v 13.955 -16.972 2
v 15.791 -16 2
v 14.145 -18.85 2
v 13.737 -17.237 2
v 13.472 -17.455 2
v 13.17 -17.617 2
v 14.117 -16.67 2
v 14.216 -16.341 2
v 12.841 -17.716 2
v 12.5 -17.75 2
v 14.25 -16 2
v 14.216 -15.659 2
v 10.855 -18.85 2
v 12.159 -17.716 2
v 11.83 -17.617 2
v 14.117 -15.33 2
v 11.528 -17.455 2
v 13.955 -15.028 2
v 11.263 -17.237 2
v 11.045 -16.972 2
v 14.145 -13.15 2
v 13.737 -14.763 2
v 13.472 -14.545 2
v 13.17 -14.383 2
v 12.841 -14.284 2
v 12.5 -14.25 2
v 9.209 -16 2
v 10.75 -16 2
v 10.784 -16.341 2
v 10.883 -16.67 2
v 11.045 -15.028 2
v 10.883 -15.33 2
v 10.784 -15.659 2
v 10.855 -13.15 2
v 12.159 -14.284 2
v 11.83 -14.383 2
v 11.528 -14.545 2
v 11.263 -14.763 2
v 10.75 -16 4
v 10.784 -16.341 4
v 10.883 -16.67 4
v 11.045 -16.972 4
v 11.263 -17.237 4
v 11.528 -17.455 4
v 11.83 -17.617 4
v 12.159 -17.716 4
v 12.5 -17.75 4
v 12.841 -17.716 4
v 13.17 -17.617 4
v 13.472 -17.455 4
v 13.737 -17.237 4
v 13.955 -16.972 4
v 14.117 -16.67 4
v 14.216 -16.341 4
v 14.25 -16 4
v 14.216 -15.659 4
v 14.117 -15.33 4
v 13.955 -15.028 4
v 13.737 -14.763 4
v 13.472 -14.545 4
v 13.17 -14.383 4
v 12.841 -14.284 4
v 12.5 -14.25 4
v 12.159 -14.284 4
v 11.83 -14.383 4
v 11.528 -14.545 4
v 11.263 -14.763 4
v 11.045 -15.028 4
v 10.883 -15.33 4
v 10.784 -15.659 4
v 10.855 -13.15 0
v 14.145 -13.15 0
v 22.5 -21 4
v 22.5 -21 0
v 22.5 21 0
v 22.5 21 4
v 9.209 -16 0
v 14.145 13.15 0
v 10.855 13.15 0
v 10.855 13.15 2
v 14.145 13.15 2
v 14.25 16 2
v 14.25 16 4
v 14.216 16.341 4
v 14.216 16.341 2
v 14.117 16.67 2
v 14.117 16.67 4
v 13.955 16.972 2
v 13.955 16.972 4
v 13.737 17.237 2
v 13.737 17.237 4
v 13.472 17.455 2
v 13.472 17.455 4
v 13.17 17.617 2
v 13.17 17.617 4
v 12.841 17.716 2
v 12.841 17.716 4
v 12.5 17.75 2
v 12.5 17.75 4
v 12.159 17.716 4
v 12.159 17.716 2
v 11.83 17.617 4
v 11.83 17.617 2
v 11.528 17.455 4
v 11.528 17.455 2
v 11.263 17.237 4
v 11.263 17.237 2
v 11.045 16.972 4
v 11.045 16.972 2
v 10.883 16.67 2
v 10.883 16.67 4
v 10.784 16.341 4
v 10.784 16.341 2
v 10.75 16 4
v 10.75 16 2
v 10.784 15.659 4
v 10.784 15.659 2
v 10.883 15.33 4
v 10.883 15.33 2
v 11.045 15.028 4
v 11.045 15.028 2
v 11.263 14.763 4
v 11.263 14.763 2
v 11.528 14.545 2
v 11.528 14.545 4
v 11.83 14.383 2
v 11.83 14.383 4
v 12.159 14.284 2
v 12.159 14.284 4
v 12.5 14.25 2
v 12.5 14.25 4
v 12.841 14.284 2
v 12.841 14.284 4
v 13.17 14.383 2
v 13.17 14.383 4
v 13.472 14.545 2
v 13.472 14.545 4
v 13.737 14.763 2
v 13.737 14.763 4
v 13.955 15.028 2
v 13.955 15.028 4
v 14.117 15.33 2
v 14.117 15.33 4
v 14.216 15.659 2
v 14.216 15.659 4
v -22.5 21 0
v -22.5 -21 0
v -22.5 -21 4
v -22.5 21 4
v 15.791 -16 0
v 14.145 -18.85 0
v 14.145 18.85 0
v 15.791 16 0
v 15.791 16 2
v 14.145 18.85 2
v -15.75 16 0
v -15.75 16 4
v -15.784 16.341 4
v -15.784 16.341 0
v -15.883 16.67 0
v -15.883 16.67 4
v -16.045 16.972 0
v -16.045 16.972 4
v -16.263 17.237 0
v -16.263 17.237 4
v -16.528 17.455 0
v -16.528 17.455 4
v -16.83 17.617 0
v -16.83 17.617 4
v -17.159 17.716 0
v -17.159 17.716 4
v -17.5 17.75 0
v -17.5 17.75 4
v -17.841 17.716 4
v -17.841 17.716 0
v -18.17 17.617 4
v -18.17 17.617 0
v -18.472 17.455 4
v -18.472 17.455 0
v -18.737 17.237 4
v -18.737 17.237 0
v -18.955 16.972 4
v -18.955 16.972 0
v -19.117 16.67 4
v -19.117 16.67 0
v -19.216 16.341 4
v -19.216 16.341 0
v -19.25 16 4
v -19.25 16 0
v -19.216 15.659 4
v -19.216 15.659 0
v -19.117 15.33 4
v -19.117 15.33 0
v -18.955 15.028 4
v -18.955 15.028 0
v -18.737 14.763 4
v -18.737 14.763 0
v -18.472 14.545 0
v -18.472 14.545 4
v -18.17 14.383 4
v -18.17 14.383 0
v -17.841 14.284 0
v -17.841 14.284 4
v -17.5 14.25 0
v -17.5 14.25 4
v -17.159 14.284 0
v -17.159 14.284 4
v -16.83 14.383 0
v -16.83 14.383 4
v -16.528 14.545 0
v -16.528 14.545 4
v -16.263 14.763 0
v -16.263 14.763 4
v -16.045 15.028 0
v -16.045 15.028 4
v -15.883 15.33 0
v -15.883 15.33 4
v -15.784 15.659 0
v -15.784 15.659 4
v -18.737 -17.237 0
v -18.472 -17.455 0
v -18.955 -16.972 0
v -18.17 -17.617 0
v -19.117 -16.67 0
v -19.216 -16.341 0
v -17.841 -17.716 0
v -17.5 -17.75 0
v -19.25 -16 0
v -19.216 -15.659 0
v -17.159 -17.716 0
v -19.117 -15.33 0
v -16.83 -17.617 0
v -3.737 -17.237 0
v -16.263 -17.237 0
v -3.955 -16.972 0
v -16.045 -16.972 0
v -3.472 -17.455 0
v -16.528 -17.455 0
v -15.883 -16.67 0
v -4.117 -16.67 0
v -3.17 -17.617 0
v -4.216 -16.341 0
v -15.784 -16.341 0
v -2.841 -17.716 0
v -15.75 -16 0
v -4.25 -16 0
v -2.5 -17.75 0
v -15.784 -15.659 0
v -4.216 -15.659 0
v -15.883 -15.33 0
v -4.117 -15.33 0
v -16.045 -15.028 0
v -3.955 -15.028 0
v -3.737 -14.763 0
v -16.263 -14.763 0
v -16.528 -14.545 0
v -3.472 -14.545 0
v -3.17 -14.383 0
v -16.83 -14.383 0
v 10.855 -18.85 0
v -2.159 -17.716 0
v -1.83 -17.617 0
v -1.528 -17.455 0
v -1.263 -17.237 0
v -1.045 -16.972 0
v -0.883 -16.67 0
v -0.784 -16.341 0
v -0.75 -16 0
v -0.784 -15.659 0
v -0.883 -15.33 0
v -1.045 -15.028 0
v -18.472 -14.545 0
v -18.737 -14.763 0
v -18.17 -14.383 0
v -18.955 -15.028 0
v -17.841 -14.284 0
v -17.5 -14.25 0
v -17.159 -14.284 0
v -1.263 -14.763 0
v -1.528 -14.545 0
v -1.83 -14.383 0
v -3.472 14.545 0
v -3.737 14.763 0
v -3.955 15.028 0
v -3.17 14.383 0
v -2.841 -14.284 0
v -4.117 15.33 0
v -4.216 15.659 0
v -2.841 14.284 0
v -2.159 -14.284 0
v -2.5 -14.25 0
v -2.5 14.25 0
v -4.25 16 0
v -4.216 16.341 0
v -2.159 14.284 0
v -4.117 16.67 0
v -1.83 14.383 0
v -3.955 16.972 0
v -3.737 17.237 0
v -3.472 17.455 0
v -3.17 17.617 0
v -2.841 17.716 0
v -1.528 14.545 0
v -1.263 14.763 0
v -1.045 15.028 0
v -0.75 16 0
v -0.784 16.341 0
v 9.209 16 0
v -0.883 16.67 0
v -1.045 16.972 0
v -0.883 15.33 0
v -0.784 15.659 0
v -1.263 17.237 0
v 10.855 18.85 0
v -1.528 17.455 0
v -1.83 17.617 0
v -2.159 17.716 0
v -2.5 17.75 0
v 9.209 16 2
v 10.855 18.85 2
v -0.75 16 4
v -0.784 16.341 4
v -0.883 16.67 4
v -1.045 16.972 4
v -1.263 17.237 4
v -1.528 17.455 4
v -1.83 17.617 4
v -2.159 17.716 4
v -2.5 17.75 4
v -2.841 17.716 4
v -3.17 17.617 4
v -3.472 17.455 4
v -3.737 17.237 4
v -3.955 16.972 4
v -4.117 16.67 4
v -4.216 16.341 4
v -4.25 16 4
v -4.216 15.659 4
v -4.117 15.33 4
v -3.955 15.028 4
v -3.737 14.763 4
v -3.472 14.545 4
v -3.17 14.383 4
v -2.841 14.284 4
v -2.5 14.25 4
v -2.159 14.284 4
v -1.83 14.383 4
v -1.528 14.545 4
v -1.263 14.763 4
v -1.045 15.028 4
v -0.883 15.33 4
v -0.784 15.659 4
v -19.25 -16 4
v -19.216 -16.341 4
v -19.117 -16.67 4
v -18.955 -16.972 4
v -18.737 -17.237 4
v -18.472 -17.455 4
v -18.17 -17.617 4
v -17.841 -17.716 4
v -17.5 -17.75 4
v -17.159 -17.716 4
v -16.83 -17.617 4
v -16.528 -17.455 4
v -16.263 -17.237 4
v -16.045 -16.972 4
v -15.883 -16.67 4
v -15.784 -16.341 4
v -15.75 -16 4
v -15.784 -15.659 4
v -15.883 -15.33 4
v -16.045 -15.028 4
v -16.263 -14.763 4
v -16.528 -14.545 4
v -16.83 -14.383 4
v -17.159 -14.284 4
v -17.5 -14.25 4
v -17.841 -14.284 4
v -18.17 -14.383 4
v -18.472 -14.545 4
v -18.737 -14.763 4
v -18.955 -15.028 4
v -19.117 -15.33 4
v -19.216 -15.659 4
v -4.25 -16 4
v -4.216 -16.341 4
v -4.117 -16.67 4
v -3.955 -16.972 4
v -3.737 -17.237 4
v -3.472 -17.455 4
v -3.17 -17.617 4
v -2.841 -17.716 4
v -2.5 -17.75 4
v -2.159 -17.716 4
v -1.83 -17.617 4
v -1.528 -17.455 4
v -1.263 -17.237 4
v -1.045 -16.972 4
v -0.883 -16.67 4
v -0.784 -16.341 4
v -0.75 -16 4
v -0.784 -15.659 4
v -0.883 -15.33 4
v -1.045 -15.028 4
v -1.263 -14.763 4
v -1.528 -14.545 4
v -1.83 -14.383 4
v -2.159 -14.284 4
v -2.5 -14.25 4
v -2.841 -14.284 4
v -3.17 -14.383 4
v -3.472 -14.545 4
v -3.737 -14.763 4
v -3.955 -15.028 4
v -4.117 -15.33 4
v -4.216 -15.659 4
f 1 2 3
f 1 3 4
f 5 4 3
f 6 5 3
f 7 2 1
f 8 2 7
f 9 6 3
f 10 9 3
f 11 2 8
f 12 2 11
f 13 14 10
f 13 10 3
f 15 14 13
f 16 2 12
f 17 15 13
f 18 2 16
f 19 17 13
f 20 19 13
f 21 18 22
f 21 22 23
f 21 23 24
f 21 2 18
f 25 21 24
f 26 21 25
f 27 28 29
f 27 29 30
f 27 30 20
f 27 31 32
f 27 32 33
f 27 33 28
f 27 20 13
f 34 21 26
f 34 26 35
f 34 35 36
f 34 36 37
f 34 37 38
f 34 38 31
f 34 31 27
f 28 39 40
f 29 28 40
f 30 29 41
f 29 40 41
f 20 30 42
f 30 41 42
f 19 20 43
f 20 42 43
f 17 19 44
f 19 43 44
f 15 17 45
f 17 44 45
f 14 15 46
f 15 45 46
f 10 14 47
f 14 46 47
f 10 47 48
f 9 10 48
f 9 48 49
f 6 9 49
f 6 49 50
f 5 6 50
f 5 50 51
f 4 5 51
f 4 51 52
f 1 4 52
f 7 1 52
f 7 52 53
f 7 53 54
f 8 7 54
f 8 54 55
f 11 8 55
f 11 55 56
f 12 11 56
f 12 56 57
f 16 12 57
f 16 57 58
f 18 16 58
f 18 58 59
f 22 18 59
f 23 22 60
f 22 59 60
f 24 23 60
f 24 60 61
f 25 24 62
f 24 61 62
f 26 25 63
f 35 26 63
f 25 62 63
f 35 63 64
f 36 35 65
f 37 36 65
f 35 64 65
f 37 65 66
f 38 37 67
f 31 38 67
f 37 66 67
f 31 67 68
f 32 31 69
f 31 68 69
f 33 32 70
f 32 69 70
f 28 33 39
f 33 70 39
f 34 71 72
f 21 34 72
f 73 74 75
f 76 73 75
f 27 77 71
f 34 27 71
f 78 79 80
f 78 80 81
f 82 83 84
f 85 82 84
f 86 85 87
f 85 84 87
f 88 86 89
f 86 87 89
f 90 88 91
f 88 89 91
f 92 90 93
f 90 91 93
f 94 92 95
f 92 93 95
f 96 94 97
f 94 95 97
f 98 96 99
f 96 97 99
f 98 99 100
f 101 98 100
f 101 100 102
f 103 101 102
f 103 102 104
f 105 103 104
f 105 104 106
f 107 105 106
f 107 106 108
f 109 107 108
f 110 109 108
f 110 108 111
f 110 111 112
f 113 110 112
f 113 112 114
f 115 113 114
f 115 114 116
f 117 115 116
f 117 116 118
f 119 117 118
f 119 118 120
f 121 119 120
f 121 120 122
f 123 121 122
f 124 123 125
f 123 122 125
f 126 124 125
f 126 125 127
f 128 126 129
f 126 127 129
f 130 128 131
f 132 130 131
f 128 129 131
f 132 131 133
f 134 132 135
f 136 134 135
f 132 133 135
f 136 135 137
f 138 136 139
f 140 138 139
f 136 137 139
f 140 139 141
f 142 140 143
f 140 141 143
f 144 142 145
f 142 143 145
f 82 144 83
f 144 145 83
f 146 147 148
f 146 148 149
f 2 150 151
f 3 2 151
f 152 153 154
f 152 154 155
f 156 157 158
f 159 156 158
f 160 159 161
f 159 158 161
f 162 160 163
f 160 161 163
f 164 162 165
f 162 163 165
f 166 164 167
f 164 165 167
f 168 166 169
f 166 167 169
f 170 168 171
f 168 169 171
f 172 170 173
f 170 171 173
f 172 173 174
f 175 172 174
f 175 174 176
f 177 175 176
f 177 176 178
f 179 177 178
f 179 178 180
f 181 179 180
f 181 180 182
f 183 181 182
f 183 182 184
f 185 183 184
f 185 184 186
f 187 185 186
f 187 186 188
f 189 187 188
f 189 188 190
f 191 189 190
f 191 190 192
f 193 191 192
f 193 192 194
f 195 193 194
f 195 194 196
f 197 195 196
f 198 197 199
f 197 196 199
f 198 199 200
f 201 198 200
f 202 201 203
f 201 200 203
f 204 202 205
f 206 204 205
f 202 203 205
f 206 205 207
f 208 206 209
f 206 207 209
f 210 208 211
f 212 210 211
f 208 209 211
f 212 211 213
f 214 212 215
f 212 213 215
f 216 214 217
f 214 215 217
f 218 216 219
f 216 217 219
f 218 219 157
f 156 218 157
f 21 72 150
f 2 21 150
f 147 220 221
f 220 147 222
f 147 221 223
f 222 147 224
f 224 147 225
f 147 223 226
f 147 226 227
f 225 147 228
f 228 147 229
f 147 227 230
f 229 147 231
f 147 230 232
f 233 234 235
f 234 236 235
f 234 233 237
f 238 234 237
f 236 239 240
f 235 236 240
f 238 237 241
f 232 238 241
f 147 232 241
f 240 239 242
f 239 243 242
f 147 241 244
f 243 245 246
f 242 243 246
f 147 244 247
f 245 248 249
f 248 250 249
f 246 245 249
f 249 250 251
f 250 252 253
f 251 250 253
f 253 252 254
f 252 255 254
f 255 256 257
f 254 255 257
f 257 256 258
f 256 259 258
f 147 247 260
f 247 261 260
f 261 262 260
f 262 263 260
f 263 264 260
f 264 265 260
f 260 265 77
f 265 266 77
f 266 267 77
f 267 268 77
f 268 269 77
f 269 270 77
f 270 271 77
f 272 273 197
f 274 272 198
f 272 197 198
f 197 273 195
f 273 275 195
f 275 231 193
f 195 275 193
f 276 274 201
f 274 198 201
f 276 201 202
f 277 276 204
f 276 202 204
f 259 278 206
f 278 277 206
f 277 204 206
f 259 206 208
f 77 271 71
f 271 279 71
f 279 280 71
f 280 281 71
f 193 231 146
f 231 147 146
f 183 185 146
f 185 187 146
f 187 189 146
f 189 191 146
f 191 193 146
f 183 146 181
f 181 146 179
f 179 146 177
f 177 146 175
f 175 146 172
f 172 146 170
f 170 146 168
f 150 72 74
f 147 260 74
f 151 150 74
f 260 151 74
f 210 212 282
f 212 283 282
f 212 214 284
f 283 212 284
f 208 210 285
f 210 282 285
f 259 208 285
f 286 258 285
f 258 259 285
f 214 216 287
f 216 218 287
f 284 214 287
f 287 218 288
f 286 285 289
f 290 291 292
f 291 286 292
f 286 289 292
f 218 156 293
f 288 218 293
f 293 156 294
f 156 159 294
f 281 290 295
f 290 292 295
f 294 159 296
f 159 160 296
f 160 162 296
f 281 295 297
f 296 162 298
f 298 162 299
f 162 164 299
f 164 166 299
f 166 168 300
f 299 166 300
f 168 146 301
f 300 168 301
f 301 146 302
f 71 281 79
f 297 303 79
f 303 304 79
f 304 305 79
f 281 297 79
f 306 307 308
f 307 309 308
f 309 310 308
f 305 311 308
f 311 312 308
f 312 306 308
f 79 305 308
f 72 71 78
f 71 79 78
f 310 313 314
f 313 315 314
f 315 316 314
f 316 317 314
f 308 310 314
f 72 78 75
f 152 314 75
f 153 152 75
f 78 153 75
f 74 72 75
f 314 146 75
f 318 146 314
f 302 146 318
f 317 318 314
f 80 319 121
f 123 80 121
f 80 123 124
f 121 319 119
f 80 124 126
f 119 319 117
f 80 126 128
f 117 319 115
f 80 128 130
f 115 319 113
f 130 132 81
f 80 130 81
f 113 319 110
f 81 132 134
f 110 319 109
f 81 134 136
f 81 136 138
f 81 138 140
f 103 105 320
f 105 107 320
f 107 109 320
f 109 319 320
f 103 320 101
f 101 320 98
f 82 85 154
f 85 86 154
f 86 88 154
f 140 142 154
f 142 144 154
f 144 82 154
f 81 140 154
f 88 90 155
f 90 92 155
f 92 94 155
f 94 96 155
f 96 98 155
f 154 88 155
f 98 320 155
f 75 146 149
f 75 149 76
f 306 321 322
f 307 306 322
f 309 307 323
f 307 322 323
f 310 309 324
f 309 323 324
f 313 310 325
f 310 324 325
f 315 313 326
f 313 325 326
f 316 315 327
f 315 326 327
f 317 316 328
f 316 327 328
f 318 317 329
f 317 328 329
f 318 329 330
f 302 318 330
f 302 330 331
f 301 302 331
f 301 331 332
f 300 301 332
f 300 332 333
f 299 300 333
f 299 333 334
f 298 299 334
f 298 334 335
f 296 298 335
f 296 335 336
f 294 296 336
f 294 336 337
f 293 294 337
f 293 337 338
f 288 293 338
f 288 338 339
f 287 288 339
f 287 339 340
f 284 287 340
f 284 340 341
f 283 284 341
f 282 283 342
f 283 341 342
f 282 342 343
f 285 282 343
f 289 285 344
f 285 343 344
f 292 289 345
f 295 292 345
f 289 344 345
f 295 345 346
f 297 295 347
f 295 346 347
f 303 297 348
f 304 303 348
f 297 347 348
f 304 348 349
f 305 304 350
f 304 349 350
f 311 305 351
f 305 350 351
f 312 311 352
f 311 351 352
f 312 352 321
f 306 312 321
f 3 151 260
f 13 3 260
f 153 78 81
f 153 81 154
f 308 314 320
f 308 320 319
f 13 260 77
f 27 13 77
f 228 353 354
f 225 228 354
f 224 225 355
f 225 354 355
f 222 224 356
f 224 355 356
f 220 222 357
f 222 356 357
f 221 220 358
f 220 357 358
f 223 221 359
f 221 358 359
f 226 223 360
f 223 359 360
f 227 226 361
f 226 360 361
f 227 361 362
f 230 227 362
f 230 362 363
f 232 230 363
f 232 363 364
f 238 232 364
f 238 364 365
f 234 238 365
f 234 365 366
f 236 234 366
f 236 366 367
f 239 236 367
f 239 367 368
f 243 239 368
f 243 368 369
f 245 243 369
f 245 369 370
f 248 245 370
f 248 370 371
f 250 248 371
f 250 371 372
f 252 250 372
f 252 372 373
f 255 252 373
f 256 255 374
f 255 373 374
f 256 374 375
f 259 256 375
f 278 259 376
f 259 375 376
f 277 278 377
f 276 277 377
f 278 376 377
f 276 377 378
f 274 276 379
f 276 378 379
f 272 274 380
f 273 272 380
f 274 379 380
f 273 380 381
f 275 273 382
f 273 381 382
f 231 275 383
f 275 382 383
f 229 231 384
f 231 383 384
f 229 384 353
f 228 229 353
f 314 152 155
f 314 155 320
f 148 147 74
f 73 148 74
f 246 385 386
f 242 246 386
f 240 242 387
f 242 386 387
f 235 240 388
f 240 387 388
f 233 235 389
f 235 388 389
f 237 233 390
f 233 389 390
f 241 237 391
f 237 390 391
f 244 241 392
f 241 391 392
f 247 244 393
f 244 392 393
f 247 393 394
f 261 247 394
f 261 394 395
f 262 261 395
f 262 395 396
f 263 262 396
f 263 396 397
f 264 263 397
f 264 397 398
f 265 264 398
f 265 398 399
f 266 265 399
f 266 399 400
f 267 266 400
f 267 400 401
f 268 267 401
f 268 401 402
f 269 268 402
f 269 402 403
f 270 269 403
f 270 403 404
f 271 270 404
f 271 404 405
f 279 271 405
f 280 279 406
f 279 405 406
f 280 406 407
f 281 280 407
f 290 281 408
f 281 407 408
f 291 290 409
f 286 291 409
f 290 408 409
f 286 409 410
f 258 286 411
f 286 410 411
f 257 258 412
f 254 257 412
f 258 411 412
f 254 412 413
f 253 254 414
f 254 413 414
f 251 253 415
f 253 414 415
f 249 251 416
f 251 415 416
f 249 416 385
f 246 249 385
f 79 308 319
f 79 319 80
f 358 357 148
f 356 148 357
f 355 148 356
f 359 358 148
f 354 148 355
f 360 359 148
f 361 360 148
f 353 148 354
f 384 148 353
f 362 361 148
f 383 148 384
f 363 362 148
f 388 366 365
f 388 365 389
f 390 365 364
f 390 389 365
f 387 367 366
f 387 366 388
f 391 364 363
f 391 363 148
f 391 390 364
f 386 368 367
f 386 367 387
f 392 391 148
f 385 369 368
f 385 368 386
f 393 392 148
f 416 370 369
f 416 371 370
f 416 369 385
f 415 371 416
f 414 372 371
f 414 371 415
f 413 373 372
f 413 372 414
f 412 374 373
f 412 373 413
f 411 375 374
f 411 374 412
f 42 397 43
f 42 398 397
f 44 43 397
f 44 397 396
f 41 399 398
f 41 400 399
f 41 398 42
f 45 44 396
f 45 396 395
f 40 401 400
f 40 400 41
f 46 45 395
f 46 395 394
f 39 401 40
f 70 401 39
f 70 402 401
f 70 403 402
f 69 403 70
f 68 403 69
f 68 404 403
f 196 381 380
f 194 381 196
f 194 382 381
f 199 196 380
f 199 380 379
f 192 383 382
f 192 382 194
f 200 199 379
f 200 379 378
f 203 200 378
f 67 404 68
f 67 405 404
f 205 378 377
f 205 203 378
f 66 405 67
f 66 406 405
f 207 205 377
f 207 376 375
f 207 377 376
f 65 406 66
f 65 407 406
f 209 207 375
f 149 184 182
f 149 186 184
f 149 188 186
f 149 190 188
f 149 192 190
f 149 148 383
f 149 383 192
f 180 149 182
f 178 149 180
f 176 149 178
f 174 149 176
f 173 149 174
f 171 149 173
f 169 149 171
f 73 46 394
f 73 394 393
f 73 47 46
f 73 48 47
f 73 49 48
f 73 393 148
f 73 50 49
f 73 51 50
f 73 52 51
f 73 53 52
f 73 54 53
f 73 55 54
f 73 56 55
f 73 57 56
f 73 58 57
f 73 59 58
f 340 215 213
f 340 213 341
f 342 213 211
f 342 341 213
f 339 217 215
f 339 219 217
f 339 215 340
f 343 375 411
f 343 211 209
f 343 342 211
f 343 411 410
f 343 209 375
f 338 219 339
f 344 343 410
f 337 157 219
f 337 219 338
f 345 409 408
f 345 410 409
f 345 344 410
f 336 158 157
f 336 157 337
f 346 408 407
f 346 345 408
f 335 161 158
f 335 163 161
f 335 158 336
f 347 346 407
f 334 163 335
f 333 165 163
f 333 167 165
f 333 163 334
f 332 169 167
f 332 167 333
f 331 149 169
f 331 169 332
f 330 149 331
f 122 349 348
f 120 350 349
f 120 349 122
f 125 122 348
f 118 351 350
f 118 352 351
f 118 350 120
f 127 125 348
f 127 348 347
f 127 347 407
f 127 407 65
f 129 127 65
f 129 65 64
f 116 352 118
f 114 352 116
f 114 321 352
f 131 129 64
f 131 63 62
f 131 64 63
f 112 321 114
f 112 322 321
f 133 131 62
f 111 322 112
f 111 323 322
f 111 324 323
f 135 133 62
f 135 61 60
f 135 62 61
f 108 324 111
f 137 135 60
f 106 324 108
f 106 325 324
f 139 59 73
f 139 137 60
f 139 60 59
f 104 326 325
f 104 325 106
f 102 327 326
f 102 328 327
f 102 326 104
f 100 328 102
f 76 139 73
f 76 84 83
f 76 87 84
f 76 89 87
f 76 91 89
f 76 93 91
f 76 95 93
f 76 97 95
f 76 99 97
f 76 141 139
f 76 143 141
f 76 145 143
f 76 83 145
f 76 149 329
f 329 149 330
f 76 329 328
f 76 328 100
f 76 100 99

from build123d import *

# Parameters (mm, degrees)
SKETCH1_W           = 45
SKETCH1_H           = 42
BOSS_EXTRUDE1_DEPTH = 4
SKETCH2_R           = 1.75
CUT_EXTRUDE1_DEPTH  = 32.036269106
SKETCH3_R           = 1.75
CUT_EXTRUDE2_DEPTH  = 32.036269106
CUT_EXTRUDE4_DEPTH  = 2


with BuildPart() as part:
    # Sketch1 → Boss-Extrude1 (new body)
    with BuildSketch(Plane.XY):
        Rectangle(SKETCH1_W, SKETCH1_H)
    extrude(amount=BOSS_EXTRUDE1_DEPTH)

    # Sketch2 → Cut-Extrude1 (cut, through all)
    with BuildSketch(Plane.XY.offset(4)):
        with Locations((-17.5, 16)):
            Circle(SKETCH2_R)
        with Locations((-2.5, 16)):
            Circle(SKETCH2_R)
        with Locations(Location((-2.5, -16, 0), (0, 0, 180))):
            Circle(SKETCH2_R)
        with Locations(Location((-17.5, -16, 0), (0, 0, 180))):
            Circle(SKETCH2_R)
    extrude(amount=-CUT_EXTRUDE1_DEPTH, mode=Mode.SUBTRACT)

    # Sketch3 → Cut-Extrude2 (cut, through all)
    with BuildSketch(Plane.XY.offset(4)):
        with Locations((12.5, 16)):
            Circle(SKETCH3_R)
        with Locations(Location((12.5, -16, 0), (0, 0, 180))):
            Circle(SKETCH3_R)
    extrude(amount=-CUT_EXTRUDE2_DEPTH, mode=Mode.SUBTRACT)

    # Sketch5 → Cut-Extrude4 (cut)
    with BuildSketch(Plane(origin=(0, 0, 0), x_dir=(-1, 0, 0), z_dir=(0, 0, -1))):
        Polygon((-9.209103466, -16), (-10.854551733, -13.15), (-14.145448267, -13.15), (-15.790896534, -16), (-14.145448267, -18.85), (-10.854551733, -18.85), align=None)
        Polygon((-10.854551733, 18.85), (-9.209103466, 16), (-10.854551733, 13.15), (-14.145448267, 13.15), (-15.790896534, 16), (-14.145448267, 18.85), align=None)
    extrude(amount=-CUT_EXTRUDE4_DEPTH, mode=Mode.SUBTRACT)


solid = part.part
